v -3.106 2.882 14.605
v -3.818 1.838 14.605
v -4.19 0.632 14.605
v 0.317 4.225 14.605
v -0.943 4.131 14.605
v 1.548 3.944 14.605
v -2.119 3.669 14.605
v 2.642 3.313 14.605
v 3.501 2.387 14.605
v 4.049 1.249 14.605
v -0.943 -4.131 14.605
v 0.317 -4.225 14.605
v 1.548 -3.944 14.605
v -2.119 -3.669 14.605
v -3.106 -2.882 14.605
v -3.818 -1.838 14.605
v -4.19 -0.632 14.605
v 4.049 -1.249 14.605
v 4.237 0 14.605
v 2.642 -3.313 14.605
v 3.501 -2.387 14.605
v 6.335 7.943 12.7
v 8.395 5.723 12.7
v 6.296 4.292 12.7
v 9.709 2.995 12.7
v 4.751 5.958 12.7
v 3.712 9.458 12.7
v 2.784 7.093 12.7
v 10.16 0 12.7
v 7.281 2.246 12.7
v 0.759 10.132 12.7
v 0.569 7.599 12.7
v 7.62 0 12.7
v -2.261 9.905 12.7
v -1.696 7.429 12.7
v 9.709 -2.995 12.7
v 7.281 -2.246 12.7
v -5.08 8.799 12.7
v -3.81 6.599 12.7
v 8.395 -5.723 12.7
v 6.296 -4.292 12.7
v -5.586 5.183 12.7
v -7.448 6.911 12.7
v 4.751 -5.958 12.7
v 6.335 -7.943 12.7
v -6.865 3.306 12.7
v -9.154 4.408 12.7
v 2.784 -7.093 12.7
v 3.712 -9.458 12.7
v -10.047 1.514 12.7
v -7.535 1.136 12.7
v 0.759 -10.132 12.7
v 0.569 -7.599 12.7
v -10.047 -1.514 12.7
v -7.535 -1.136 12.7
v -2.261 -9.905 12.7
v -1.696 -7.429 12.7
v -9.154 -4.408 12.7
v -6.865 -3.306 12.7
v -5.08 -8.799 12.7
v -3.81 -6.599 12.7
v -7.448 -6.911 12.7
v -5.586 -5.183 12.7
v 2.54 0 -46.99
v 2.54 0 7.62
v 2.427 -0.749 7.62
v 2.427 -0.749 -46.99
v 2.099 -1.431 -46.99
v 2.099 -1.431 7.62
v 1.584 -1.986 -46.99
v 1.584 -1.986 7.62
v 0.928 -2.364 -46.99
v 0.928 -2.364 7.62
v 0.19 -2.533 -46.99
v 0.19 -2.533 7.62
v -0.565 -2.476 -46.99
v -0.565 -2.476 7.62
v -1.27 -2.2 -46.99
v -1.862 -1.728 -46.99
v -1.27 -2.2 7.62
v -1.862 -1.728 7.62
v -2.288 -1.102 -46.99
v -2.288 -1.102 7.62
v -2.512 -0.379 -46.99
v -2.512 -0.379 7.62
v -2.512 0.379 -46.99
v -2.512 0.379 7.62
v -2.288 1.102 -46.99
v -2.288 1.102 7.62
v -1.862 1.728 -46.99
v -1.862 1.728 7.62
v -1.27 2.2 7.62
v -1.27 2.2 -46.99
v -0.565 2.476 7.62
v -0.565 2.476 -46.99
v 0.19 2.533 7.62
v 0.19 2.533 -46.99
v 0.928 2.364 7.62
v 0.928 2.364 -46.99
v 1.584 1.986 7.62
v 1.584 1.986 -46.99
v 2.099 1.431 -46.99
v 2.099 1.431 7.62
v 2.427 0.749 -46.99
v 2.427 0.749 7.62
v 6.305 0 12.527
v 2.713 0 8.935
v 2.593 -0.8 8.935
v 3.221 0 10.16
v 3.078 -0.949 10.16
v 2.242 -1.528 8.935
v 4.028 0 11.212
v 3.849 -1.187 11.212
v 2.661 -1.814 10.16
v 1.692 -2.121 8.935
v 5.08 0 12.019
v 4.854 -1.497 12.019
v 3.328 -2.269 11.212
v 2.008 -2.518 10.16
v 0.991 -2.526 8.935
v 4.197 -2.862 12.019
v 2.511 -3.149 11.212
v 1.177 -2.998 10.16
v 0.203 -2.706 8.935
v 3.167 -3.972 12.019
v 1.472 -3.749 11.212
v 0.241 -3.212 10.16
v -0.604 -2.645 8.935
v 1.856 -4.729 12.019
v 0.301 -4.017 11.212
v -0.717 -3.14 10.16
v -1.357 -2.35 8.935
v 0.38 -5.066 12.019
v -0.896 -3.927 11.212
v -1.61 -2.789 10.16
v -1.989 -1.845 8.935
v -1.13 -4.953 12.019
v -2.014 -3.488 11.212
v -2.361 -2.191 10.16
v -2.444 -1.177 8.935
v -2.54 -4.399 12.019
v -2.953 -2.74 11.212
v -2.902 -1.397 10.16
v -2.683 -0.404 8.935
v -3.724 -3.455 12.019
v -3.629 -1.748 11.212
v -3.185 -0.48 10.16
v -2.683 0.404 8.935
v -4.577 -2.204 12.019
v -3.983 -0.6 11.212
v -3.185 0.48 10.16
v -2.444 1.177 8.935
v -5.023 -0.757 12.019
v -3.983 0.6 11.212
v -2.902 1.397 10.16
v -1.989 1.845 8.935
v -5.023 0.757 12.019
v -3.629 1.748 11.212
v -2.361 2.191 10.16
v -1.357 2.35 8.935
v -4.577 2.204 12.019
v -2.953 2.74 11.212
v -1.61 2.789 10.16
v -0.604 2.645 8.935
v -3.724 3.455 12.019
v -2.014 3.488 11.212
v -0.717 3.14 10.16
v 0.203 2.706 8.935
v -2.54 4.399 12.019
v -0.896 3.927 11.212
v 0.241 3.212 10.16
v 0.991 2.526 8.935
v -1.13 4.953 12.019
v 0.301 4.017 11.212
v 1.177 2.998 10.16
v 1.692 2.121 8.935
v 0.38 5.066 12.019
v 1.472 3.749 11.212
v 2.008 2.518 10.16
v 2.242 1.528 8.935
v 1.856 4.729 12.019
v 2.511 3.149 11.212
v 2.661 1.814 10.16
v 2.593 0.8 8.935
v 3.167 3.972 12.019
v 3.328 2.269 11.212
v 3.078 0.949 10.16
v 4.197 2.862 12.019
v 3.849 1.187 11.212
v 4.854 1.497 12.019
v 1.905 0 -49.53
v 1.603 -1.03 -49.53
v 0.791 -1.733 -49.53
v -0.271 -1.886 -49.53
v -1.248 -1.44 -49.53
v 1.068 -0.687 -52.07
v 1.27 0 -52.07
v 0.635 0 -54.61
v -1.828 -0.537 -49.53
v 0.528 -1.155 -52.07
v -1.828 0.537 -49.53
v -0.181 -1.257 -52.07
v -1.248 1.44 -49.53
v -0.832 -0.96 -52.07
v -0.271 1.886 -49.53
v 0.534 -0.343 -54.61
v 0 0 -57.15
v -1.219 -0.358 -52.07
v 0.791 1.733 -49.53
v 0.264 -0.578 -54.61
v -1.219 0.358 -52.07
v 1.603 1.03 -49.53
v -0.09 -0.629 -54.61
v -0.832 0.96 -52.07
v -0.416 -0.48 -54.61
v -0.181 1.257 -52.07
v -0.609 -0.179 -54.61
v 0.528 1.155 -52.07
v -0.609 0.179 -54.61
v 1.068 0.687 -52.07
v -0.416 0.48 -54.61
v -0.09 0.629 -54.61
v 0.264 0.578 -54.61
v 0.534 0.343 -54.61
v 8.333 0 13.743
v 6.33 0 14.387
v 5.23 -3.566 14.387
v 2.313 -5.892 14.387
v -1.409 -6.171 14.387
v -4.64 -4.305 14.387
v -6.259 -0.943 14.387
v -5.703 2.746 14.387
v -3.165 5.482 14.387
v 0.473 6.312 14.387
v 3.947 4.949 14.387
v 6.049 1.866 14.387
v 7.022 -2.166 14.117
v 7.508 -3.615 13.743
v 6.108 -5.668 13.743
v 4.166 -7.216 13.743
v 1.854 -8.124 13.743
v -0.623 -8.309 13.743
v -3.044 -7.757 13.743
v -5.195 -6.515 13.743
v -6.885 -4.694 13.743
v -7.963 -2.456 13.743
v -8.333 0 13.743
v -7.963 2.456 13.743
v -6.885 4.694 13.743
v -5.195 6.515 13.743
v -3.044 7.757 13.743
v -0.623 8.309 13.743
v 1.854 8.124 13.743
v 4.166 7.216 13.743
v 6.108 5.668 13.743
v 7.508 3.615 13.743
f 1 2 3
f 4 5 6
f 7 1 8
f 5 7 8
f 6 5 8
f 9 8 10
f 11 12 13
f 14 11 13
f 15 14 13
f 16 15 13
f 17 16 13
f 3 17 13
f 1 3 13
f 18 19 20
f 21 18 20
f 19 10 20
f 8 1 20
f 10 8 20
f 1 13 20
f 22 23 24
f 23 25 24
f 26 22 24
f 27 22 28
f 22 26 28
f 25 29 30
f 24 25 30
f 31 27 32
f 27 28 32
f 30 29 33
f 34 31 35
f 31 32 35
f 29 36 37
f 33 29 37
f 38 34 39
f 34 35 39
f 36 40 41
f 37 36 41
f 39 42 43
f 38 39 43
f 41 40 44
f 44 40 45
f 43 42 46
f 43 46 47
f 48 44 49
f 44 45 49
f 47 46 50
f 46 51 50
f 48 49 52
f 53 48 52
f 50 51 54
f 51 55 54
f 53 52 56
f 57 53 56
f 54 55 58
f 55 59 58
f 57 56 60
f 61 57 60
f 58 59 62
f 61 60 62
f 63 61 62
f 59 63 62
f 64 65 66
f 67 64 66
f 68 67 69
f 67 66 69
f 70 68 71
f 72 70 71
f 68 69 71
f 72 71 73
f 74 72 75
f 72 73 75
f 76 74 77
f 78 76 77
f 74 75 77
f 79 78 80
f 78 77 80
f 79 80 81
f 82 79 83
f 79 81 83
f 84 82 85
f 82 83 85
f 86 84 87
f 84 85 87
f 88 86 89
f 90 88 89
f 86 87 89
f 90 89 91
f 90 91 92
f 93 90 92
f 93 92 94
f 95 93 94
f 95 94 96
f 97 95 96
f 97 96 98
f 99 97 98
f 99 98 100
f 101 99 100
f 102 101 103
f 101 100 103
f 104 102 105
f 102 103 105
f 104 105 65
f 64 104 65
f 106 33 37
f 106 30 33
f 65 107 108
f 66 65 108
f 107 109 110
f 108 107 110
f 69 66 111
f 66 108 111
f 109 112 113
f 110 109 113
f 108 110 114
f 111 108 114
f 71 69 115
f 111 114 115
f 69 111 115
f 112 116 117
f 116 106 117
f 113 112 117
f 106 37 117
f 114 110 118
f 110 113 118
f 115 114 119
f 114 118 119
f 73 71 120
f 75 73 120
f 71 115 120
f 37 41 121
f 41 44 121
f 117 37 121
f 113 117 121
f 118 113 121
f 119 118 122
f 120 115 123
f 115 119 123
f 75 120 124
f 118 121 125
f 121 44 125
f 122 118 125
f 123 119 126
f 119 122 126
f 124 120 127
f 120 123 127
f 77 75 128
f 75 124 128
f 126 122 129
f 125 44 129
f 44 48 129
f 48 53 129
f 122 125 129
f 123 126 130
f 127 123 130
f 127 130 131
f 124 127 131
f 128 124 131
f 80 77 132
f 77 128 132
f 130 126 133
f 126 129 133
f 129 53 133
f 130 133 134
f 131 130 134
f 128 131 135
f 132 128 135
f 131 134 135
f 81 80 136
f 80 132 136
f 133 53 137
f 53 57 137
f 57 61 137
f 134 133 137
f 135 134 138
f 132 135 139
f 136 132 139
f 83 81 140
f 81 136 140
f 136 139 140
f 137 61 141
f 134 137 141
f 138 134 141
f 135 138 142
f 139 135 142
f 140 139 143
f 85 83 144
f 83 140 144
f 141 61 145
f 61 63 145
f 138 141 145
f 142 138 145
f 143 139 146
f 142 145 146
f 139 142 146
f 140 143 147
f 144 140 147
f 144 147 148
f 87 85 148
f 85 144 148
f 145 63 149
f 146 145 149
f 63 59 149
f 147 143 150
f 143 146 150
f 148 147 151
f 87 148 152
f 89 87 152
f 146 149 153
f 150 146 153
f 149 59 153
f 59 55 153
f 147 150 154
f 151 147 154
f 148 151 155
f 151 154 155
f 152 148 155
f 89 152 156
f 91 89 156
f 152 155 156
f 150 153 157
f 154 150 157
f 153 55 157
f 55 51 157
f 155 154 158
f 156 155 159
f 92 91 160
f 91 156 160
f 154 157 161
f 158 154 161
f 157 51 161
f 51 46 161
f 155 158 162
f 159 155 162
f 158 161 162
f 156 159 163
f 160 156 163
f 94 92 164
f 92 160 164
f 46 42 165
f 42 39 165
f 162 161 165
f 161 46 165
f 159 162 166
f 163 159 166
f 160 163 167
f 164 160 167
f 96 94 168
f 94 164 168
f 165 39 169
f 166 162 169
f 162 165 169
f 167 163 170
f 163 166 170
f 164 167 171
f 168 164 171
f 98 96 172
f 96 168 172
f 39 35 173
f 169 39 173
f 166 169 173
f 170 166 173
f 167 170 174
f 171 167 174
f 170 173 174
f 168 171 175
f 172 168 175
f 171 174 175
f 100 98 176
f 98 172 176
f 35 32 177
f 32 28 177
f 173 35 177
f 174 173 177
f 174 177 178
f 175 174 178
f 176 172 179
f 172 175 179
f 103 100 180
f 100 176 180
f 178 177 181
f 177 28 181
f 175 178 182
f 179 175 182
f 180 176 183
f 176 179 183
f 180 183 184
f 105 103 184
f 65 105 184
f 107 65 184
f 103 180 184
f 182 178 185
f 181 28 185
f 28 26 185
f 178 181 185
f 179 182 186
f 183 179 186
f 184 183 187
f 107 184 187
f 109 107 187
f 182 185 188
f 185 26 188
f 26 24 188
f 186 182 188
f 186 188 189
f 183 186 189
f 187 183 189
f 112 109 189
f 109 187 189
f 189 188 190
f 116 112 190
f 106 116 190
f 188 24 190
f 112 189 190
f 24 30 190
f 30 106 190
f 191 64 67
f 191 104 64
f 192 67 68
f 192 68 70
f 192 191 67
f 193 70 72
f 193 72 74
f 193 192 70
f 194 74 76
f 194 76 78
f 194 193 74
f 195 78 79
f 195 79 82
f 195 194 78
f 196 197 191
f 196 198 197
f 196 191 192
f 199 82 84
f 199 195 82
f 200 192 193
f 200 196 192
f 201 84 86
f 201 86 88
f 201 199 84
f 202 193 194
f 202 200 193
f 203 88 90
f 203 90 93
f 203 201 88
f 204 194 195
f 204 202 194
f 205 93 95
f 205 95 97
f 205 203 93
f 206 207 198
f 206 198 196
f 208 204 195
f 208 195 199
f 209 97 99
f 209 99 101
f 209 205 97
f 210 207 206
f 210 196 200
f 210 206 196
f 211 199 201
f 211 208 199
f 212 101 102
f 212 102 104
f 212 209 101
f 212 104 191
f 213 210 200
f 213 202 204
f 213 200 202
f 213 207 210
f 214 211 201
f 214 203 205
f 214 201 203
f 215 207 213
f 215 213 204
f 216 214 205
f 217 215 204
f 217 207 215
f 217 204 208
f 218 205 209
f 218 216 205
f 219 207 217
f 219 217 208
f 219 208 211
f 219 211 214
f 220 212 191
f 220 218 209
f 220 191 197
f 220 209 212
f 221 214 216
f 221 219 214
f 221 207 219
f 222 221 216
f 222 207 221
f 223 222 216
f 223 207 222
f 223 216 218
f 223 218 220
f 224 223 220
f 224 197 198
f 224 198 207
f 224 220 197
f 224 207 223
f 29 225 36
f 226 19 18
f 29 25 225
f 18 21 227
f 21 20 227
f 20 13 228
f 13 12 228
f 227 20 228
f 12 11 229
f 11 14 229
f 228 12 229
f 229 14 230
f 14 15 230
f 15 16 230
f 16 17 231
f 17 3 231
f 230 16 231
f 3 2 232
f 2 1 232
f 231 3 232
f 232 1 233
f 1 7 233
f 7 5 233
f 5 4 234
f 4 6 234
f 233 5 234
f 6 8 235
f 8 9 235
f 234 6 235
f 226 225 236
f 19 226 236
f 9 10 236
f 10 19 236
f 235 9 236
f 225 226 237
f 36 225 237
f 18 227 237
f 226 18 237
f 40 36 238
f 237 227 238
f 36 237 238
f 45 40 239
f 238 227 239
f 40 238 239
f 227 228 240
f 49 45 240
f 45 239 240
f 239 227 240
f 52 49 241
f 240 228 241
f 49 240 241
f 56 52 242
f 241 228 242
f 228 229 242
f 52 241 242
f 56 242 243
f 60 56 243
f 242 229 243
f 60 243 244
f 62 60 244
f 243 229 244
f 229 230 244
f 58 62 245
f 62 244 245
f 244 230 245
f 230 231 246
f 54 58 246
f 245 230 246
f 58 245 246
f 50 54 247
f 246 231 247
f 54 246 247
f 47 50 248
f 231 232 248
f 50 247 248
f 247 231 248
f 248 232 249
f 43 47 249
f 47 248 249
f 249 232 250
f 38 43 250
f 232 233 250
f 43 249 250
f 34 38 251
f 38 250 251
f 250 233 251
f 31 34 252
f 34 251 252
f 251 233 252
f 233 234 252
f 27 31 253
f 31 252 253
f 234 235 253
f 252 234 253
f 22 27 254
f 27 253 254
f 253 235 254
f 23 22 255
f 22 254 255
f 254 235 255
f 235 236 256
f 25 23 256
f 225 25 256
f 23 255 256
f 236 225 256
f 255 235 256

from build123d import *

# Parameters (mm, degrees)
F0_W     = 2.54
F0_H     = 69.85
F2_SIZE2 = 2.54
F2_SIZE  = 10.16
F3_R     = 5.08


# Not quite as in the source:
# - a fillet or chamfer that OpenCascade refuses, or shapes differently, is made with other operations: its cross-section is extruded or revolved along the edge and cut away or added


with BuildPart() as f1:
    # F0 (on Front) → F1 (revolve)
    with BuildSketch(Plane.XZ):
        Polygon((0, 14.605), (0, 12.7), (2.54, 12.7), (10.16, 12.7), (10.16, 14.605), align=None)
        with Locations((1.27, -22.225)):
            Rectangle(F0_W, F0_H)
    revolve(axis=Axis((0, 0, -22.225), (0, 0, -1)))

    # F2
    f2_edges = [f1.edges().sort_by_distance(p)[0] for p in [
        (-2.54, 0, -57.15),
    ]]
    f2_side = f1.faces().sort_by_distance((-2.54, 0, -22.225))[0]
    chamfer(f2_edges, length=F2_SIZE, length2=F2_SIZE2, reference=f2_side)

    # F3
    f3_edges = [f1.edges().sort_by_distance(p)[0] for p in [
        (-2.54, 0, 12.7),
    ]]
    fillet(f3_edges, radius=F3_R)

    # F4: fillet of radius 10.16 on 1 edges, made by hand

    # F4_s1 → F4_t2 (revolve, cut)
    with BuildSketch(Plane.XZ):
        with BuildLine():
            ThreePointArc((10.16, 12.7), (7.3479662746, 14.1170318444), (4.2371143013, 14.605))
            Line((4.2371143013, 14.605), (10.16, 14.605))
            Line((10.16, 14.605), (10.16, 12.7))
        make_face()
    revolve(axis=Axis((0, 0, 14.605), (0, 0, -1)), mode=Mode.SUBTRACT)


solid = f1.part
